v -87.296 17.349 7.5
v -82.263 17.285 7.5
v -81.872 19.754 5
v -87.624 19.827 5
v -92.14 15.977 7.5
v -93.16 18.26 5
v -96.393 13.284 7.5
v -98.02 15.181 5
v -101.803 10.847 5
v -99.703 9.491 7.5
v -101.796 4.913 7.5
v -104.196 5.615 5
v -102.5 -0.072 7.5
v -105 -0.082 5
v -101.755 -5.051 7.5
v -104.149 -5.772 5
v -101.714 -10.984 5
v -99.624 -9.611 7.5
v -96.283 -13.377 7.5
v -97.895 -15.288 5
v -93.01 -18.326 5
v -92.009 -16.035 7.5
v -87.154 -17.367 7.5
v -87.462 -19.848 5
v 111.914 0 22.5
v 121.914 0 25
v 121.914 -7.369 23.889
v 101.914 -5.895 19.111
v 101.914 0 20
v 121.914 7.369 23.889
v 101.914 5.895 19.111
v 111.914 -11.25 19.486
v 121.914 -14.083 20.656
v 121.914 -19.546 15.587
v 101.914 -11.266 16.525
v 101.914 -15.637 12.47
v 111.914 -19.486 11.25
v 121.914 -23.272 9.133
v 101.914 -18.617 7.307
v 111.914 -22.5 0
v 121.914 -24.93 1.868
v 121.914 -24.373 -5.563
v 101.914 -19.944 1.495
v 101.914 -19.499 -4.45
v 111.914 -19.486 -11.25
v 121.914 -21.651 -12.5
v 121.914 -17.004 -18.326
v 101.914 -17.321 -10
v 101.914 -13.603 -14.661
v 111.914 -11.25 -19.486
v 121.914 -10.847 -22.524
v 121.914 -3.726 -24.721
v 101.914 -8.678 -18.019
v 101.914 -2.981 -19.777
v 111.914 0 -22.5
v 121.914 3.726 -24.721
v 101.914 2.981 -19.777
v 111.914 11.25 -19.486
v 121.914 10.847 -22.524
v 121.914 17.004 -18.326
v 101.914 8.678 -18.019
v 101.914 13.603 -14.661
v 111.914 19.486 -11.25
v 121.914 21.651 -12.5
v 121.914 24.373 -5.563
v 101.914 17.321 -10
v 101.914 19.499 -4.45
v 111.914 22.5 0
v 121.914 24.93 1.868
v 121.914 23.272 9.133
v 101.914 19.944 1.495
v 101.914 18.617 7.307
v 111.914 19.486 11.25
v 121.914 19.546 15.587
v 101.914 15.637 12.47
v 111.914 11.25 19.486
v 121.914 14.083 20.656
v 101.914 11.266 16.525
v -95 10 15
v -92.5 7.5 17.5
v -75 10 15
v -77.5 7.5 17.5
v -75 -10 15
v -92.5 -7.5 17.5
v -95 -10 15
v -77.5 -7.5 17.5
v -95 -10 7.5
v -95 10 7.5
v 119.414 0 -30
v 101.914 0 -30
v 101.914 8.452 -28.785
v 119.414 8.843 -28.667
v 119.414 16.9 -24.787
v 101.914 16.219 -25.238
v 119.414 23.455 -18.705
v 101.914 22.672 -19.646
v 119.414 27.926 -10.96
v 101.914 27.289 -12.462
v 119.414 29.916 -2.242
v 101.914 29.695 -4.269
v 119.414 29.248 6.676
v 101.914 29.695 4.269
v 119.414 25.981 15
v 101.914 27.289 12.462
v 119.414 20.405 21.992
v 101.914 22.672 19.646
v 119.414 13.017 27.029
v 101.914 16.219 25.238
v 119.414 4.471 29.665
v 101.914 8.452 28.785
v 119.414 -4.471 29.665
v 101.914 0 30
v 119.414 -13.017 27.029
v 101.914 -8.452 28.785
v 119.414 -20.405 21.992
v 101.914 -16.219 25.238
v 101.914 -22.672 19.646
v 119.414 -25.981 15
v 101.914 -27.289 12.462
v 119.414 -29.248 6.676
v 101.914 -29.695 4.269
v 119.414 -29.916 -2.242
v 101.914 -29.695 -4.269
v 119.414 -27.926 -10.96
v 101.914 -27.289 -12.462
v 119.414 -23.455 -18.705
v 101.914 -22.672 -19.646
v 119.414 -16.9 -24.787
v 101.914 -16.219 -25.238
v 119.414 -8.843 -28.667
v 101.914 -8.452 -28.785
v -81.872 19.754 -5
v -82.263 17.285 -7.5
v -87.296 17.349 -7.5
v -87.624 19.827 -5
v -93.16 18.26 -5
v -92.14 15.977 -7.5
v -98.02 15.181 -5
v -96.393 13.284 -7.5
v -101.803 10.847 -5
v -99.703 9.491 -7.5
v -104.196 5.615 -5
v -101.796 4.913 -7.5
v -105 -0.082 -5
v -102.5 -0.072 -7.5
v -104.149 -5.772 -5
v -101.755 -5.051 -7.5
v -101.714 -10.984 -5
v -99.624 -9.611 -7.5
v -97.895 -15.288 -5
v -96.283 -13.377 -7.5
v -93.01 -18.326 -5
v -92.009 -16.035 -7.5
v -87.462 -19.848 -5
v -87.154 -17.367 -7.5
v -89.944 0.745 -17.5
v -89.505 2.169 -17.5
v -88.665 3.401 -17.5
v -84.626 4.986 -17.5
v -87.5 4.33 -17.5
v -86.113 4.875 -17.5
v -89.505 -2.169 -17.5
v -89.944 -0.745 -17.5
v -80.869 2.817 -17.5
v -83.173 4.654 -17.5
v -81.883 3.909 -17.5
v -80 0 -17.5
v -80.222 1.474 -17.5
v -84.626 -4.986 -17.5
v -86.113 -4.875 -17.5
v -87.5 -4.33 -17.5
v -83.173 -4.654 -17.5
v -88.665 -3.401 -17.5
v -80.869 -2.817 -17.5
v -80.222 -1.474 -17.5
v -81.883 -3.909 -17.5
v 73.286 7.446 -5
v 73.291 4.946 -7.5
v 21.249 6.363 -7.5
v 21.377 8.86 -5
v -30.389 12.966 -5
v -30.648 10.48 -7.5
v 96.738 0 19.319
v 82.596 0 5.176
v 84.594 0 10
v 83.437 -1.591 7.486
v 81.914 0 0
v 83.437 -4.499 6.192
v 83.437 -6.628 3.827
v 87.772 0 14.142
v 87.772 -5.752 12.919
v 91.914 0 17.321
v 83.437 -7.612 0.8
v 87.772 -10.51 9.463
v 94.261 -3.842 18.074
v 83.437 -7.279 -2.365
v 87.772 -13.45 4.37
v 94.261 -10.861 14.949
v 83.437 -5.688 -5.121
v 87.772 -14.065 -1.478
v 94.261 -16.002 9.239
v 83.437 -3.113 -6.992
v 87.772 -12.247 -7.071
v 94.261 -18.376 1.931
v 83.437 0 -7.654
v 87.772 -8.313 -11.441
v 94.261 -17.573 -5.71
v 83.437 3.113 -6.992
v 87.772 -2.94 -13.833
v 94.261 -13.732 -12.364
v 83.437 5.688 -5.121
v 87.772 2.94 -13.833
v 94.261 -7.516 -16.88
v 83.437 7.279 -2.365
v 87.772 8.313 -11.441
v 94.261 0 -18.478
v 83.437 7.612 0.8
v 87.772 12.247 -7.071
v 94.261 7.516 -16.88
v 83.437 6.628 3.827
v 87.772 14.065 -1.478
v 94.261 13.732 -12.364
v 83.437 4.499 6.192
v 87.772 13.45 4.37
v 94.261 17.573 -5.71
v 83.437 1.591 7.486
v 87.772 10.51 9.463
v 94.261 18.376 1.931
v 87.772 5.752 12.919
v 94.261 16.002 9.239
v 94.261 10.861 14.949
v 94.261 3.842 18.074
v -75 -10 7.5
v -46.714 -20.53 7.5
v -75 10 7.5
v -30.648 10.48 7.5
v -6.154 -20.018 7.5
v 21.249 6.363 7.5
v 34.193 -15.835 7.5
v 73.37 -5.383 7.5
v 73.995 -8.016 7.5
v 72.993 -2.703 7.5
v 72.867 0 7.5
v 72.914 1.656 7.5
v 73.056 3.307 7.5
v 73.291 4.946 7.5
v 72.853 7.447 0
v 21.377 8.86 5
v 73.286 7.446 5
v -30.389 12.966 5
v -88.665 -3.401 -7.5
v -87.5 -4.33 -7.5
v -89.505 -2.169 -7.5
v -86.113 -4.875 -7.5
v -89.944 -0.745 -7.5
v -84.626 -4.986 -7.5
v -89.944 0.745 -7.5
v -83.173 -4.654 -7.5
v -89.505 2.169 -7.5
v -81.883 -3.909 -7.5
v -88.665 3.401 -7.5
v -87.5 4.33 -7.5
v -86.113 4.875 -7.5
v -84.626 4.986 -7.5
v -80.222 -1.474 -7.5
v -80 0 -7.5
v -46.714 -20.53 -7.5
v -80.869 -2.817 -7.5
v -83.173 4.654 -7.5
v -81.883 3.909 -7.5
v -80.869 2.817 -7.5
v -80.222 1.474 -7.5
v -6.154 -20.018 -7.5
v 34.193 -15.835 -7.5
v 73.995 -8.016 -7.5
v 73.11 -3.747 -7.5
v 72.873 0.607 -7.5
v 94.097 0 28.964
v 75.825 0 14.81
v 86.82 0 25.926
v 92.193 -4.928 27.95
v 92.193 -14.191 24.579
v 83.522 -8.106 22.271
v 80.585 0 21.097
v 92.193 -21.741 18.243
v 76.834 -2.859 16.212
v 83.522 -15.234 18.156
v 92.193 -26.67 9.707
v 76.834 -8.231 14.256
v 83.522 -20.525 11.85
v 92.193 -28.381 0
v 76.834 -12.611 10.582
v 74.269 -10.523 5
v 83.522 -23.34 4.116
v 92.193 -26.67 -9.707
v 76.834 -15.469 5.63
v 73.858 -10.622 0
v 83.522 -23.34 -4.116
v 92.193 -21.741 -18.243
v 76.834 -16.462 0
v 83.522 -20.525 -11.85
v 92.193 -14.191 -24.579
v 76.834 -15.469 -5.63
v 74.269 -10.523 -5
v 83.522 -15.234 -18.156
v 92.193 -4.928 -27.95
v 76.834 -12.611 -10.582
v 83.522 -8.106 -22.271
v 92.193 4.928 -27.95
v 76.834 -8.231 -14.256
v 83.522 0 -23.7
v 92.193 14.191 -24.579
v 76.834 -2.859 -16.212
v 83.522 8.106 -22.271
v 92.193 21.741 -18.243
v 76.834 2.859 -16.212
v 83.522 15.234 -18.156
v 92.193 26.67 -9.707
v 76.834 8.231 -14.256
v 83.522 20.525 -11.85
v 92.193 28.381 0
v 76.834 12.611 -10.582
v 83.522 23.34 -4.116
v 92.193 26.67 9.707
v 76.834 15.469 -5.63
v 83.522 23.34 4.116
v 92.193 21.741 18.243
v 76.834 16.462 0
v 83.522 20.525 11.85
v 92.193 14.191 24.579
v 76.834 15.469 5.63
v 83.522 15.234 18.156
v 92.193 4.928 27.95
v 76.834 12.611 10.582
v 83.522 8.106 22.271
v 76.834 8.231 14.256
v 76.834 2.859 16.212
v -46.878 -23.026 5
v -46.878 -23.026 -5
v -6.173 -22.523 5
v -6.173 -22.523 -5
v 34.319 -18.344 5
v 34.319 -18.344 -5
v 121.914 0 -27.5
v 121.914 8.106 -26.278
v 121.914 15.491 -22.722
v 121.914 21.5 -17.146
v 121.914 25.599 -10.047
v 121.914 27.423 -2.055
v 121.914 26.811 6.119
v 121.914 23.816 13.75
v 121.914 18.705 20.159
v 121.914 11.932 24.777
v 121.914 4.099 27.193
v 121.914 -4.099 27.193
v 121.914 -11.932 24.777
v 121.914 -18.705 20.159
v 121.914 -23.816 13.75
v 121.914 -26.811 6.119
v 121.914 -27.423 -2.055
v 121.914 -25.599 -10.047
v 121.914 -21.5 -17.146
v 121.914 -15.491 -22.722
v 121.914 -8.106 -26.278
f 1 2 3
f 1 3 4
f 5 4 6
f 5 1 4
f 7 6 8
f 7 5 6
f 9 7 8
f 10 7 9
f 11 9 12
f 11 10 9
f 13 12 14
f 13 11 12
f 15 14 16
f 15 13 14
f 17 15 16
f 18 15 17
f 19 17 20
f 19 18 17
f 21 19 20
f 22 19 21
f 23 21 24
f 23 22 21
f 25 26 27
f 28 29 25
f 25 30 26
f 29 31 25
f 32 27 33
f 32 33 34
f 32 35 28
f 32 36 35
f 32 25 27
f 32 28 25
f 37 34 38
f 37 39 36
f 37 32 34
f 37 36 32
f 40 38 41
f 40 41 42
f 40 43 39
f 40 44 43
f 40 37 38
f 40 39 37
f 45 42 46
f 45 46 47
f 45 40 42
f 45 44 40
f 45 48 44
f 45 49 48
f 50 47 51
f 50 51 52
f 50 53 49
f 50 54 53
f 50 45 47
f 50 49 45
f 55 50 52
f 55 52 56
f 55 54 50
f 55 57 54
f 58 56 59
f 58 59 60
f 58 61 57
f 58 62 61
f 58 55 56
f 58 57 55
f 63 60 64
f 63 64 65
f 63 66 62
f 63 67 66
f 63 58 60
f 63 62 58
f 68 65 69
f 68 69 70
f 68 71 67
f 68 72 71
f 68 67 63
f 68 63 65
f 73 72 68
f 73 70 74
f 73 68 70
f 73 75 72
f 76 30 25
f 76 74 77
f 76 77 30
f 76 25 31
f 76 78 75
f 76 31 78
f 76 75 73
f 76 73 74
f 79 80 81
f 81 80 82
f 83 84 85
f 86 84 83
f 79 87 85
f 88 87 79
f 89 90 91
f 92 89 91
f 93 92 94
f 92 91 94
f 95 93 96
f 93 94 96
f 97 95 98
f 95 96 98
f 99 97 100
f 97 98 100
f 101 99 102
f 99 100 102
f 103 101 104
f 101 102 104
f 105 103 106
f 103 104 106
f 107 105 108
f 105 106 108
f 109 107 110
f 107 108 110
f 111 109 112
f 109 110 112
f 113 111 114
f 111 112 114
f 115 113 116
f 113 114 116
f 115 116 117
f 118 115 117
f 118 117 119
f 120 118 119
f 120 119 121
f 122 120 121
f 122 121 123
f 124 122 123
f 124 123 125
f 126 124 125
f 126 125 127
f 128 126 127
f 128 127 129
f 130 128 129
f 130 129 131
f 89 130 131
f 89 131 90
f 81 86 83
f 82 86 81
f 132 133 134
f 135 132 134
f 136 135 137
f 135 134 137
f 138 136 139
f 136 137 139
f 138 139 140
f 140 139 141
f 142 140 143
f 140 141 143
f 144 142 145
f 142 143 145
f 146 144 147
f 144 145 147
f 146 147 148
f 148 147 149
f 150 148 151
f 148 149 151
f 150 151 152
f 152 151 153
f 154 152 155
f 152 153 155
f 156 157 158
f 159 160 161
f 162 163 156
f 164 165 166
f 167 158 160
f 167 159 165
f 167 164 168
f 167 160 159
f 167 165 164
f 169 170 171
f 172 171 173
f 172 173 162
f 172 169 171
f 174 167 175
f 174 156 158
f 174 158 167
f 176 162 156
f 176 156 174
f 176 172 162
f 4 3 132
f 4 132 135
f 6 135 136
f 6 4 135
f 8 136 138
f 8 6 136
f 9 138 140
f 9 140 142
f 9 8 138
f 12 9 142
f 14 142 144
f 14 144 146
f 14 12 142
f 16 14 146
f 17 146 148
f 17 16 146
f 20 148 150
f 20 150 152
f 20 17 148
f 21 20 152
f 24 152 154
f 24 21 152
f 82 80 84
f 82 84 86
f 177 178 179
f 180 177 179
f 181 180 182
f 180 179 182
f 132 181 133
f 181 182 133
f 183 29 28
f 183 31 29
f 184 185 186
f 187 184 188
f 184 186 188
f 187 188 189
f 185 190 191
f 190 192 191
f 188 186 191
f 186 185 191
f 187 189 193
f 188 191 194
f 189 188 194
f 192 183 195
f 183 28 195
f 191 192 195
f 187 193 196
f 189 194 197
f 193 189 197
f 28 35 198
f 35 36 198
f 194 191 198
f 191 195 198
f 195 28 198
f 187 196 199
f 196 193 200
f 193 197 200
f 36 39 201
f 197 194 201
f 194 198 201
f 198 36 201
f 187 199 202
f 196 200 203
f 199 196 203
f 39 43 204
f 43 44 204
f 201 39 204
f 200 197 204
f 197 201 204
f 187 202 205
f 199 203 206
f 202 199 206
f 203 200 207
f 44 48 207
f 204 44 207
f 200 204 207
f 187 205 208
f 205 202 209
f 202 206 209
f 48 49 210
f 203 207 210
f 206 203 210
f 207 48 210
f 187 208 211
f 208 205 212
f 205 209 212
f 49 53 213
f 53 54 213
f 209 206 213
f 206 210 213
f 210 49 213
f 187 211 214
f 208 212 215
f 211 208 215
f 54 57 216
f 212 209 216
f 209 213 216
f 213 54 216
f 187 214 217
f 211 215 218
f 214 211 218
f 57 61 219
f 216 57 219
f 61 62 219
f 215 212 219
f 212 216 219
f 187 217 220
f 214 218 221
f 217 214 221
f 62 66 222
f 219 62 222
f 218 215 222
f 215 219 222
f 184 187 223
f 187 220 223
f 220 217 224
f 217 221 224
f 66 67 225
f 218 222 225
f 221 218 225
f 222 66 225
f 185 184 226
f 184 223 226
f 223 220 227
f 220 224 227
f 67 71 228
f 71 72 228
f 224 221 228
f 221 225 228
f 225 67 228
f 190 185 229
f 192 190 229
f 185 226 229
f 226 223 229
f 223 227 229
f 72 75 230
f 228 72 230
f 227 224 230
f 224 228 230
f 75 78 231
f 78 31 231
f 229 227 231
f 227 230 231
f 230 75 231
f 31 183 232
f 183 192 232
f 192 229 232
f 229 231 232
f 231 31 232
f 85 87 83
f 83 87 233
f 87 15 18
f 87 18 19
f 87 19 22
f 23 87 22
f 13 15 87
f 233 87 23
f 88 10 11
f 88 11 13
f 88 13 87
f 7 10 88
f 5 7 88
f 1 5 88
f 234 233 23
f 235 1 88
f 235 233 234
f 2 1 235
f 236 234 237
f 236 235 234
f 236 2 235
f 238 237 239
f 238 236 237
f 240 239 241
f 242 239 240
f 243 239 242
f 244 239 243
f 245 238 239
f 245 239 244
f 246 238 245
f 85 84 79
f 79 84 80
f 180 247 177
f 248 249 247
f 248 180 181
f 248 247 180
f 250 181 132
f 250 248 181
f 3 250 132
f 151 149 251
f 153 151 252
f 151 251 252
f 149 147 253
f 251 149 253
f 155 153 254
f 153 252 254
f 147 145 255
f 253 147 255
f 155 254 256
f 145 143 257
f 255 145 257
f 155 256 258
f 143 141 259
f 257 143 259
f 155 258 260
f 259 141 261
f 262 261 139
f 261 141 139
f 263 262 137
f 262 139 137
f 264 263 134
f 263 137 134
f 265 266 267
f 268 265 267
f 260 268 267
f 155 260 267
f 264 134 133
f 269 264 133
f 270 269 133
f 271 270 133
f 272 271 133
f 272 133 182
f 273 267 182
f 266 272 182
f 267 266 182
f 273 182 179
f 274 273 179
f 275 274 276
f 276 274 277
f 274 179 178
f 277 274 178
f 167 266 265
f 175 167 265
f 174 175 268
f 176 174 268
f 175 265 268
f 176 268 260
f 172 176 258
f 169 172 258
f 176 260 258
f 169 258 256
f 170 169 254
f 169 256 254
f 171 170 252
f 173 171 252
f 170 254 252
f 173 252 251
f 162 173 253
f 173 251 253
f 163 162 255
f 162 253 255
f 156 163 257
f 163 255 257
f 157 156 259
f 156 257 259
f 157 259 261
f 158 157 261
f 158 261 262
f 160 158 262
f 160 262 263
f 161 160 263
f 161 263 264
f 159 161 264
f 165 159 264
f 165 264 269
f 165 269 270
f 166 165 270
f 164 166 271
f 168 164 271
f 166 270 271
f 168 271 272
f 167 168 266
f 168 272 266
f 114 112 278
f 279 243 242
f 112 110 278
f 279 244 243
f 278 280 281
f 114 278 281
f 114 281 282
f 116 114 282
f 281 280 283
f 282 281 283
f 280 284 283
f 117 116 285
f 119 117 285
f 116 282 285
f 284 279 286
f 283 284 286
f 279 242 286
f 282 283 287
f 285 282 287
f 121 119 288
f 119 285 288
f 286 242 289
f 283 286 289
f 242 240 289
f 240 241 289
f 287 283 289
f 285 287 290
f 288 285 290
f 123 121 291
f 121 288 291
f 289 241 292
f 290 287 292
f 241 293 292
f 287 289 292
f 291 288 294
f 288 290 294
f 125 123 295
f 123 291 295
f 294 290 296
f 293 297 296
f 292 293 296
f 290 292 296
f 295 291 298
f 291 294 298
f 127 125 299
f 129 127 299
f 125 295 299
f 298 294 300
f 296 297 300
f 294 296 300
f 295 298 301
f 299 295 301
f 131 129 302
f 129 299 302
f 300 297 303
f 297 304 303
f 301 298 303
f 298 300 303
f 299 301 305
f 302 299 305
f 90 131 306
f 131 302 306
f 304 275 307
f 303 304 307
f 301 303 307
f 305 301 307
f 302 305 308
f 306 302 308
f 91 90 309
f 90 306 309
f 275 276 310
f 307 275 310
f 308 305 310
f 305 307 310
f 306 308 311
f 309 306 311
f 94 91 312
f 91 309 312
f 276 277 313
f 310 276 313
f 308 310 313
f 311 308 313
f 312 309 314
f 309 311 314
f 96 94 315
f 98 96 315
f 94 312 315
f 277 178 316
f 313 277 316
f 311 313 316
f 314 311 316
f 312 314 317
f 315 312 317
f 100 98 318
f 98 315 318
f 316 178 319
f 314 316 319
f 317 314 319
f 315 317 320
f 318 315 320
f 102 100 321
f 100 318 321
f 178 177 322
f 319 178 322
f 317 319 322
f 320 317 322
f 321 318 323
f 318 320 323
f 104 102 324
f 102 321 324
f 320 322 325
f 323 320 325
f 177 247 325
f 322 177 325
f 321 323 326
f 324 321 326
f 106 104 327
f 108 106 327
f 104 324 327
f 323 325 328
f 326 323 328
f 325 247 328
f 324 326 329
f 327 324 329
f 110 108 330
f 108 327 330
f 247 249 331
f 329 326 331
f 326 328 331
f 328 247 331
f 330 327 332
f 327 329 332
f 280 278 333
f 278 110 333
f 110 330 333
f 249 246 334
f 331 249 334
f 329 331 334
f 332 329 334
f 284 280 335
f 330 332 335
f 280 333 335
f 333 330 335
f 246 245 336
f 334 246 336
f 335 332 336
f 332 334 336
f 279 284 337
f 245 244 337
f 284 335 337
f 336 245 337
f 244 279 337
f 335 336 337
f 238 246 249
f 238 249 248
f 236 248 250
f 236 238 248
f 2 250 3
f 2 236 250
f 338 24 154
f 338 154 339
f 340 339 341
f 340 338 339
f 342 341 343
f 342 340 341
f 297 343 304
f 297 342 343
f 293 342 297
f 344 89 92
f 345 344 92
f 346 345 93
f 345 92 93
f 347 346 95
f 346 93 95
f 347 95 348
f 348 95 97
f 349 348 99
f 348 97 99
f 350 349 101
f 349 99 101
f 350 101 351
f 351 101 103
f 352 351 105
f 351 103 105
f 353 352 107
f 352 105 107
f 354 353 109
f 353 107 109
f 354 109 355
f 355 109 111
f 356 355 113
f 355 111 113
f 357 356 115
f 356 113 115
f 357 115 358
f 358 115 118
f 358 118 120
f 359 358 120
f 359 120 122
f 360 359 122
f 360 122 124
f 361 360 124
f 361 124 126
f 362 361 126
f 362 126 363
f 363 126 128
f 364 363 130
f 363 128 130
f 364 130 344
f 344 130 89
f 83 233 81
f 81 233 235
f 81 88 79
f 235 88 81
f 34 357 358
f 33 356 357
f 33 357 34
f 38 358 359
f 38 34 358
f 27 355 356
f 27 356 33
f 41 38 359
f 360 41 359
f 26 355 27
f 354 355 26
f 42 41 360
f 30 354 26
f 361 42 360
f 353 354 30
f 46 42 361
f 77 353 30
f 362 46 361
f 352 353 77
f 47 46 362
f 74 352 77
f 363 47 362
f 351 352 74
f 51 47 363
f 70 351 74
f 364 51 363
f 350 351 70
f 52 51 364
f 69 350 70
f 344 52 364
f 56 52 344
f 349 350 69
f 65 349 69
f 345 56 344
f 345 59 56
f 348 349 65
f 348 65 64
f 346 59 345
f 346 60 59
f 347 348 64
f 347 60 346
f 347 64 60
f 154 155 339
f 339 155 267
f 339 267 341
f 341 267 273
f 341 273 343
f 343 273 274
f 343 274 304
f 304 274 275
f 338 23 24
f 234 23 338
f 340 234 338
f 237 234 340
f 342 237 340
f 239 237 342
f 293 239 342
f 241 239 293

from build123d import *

# Parameters (mm, degrees)
BOSS_EXTRUDE1_DEPTH = 7.5
CHAMFER1_SIZE       = 2.5
SKETCH3_W           = 20
SKETCH3_H           = 20
BOSS_EXTRUDE2_DEPTH = 10
CHAMFER4_SIZE       = 2.5
SKETCH6_R           = 5
BOSS_EXTRUDE3_DEPTH = 10
CUT_EXTRUDE3_DEPTH  = 17
SKETCH11_R          = 30
SKETCH11_R_2        = 20
BOSS_EXTRUDE4_DEPTH = 20
CHAMFER5_SIZE2      = 20
CHAMFER5_SIZE       = 5
CHAMFER6_SIZE       = 2.5


with BuildPart() as part:
    # Sketch2 → Boss-Extrude1 (new, symmetric)
    with BuildSketch(Plane.XY):
        with BuildLine():
            ThreePointArc((84.922137279, 7.499595816), (1.268561005, 10.133701432), (-81.871756055, 19.753837344))
            ThreePointArc((-81.871756055, 19.753837344), (-104.803696773, 2.795280684), (-87.461525308, -19.847944306))
            ThreePointArc((-87.461525308, -19.847944306), (0.380210023, -22.09713345), (86.984359422, -7.232725467))
            ThreePointArc((86.984359422, -7.232725467), (92.427584063, 1.039709088), (84.922137279, 7.499595816))
        make_face()
    extrude(amount=BOSS_EXTRUDE1_DEPTH, both=True)

    # Chamfer1
    chamfer1_edges = [part.edges().sort_by_distance(p)[0] for p in [
        (92.427584063, 1.039709088, 7.5),
        (1.268561005, 10.133701432, 7.5),
        (-104.803696773, 2.795280684, 7.5),
        (0.380210023, -22.09713345, 7.5),
        (-104.803696773, 2.795280684, -7.5),
        (1.268561005, 10.133701432, -7.5),
        (92.427584063, 1.039709088, -7.5),
        (0.380210023, -22.09713345, -7.5),
    ]]
    chamfer(chamfer1_edges, length=CHAMFER1_SIZE)

    # Sketch3 → Boss-Extrude2 (add)
    with BuildSketch(Plane.XY.offset(7.5)):
        with Locations((-85, 0)):
            Rectangle(SKETCH3_W, SKETCH3_H)
    extrude(amount=BOSS_EXTRUDE2_DEPTH)

    # Chamfer4
    chamfer4_edges = [part.edges().sort_by_distance(p)[0] for p in [
        (-75, 0, 17.5),
        (-85, 10, 17.5),
        (-95, 0, 17.5),
        (-85, -10, 17.5),
    ]]
    chamfer(chamfer4_edges, length=CHAMFER4_SIZE)

    # Sketch6 → Boss-Extrude3 (add)
    with BuildSketch(Plane(origin=(0, 0, -7.5), x_dir=(-1, 0, 0), z_dir=(0, 0, -1))):
        with Locations(Location((85, 0, 0), (0, 0, 180))):
            Circle(SKETCH6_R)
    extrude(amount=BOSS_EXTRUDE3_DEPTH)

    # Sketch7 → Cut-Extrude3 (cut, symmetric)
    with BuildSketch(Plane(origin=(0, 0, 0), x_dir=(1, 0, 0), z_dir=(0, 1, 0))):
        with BuildLine():
            ThreePointArc((101.914257425, 20), (87.772121801, 14.142135624), (81.914257425, 0))
            Line((81.914257425, 0), (101.914257425, 0))
            Line((101.914257425, 0), (101.914257425, 20))
        make_face()
        with BuildLine():
            Line((101.914257425, 0), (81.914257425, 0))
            ThreePointArc((81.914257425, 0), (87.772121801, -14.142135624), (101.914257425, -20))
            Line((101.914257425, -20), (101.914257425, 0))
        make_face()
    extrude(amount=CUT_EXTRUDE3_DEPTH, both=True, mode=Mode.SUBTRACT)

    # Sketch7<5> one side → Revolve2 (revolve)
    with BuildSketch(Plane(origin=(0, 0, 0), x_dir=(1, 0, 0), z_dir=(0, 1, 0)), mode=Mode.PRIVATE) as revolve2_sk:
        with BuildLine():
            Line((101.914257425, 20), (101.914257425, 30))
            ThreePointArc((101.914257425, 30), (80.701053989, 21.213203436), (71.914257425, 0))
            Line((71.914257425, 0), (81.914257425, 0))
            ThreePointArc((81.914257425, 0), (87.772121801, 14.142135624), (101.914257425, 20))
        make_face()
    revolve(revolve2_sk.sketch.rotate(Axis((-136.30632513, 0, 0), (1, 0, 0)), 180), axis=Axis((-136.30632513, 0, 0), (1, 0, 0)))

    # Sketch11 → Boss-Extrude4 (add)
    with BuildSketch(Plane(origin=(101.914257425, 0, 0), x_dir=(0, 0, -1), z_dir=(1, 0, 0))):
        Circle(SKETCH11_R)
        with Locations(Location((0, 0, 0), (0, 0, 180))):
            Circle(SKETCH11_R_2, mode=Mode.SUBTRACT)
    extrude(amount=BOSS_EXTRUDE4_DEPTH)

    # Chamfer5
    chamfer5_edges = [part.edges().sort_by_distance(p)[0] for p in [
        (121.914257425, 0, -20),
    ]]
    chamfer5_side = [part.faces().sort_by_distance(p)[0] for p in [
        (121.914257425, 0, -20.1),
    ]]
    chamfer(chamfer5_edges, length=CHAMFER5_SIZE - 0.0001, length2=CHAMFER5_SIZE2 - 0.0001, reference=chamfer5_side[0])  # a hair under: the kernel refuses the full size

    # Chamfer6
    chamfer6_edges = [part.edges().sort_by_distance(p)[0] for p in [
        (121.914257425, 0, 30),
    ]]
    chamfer(chamfer6_edges, length=CHAMFER6_SIZE)


solid = part.part
